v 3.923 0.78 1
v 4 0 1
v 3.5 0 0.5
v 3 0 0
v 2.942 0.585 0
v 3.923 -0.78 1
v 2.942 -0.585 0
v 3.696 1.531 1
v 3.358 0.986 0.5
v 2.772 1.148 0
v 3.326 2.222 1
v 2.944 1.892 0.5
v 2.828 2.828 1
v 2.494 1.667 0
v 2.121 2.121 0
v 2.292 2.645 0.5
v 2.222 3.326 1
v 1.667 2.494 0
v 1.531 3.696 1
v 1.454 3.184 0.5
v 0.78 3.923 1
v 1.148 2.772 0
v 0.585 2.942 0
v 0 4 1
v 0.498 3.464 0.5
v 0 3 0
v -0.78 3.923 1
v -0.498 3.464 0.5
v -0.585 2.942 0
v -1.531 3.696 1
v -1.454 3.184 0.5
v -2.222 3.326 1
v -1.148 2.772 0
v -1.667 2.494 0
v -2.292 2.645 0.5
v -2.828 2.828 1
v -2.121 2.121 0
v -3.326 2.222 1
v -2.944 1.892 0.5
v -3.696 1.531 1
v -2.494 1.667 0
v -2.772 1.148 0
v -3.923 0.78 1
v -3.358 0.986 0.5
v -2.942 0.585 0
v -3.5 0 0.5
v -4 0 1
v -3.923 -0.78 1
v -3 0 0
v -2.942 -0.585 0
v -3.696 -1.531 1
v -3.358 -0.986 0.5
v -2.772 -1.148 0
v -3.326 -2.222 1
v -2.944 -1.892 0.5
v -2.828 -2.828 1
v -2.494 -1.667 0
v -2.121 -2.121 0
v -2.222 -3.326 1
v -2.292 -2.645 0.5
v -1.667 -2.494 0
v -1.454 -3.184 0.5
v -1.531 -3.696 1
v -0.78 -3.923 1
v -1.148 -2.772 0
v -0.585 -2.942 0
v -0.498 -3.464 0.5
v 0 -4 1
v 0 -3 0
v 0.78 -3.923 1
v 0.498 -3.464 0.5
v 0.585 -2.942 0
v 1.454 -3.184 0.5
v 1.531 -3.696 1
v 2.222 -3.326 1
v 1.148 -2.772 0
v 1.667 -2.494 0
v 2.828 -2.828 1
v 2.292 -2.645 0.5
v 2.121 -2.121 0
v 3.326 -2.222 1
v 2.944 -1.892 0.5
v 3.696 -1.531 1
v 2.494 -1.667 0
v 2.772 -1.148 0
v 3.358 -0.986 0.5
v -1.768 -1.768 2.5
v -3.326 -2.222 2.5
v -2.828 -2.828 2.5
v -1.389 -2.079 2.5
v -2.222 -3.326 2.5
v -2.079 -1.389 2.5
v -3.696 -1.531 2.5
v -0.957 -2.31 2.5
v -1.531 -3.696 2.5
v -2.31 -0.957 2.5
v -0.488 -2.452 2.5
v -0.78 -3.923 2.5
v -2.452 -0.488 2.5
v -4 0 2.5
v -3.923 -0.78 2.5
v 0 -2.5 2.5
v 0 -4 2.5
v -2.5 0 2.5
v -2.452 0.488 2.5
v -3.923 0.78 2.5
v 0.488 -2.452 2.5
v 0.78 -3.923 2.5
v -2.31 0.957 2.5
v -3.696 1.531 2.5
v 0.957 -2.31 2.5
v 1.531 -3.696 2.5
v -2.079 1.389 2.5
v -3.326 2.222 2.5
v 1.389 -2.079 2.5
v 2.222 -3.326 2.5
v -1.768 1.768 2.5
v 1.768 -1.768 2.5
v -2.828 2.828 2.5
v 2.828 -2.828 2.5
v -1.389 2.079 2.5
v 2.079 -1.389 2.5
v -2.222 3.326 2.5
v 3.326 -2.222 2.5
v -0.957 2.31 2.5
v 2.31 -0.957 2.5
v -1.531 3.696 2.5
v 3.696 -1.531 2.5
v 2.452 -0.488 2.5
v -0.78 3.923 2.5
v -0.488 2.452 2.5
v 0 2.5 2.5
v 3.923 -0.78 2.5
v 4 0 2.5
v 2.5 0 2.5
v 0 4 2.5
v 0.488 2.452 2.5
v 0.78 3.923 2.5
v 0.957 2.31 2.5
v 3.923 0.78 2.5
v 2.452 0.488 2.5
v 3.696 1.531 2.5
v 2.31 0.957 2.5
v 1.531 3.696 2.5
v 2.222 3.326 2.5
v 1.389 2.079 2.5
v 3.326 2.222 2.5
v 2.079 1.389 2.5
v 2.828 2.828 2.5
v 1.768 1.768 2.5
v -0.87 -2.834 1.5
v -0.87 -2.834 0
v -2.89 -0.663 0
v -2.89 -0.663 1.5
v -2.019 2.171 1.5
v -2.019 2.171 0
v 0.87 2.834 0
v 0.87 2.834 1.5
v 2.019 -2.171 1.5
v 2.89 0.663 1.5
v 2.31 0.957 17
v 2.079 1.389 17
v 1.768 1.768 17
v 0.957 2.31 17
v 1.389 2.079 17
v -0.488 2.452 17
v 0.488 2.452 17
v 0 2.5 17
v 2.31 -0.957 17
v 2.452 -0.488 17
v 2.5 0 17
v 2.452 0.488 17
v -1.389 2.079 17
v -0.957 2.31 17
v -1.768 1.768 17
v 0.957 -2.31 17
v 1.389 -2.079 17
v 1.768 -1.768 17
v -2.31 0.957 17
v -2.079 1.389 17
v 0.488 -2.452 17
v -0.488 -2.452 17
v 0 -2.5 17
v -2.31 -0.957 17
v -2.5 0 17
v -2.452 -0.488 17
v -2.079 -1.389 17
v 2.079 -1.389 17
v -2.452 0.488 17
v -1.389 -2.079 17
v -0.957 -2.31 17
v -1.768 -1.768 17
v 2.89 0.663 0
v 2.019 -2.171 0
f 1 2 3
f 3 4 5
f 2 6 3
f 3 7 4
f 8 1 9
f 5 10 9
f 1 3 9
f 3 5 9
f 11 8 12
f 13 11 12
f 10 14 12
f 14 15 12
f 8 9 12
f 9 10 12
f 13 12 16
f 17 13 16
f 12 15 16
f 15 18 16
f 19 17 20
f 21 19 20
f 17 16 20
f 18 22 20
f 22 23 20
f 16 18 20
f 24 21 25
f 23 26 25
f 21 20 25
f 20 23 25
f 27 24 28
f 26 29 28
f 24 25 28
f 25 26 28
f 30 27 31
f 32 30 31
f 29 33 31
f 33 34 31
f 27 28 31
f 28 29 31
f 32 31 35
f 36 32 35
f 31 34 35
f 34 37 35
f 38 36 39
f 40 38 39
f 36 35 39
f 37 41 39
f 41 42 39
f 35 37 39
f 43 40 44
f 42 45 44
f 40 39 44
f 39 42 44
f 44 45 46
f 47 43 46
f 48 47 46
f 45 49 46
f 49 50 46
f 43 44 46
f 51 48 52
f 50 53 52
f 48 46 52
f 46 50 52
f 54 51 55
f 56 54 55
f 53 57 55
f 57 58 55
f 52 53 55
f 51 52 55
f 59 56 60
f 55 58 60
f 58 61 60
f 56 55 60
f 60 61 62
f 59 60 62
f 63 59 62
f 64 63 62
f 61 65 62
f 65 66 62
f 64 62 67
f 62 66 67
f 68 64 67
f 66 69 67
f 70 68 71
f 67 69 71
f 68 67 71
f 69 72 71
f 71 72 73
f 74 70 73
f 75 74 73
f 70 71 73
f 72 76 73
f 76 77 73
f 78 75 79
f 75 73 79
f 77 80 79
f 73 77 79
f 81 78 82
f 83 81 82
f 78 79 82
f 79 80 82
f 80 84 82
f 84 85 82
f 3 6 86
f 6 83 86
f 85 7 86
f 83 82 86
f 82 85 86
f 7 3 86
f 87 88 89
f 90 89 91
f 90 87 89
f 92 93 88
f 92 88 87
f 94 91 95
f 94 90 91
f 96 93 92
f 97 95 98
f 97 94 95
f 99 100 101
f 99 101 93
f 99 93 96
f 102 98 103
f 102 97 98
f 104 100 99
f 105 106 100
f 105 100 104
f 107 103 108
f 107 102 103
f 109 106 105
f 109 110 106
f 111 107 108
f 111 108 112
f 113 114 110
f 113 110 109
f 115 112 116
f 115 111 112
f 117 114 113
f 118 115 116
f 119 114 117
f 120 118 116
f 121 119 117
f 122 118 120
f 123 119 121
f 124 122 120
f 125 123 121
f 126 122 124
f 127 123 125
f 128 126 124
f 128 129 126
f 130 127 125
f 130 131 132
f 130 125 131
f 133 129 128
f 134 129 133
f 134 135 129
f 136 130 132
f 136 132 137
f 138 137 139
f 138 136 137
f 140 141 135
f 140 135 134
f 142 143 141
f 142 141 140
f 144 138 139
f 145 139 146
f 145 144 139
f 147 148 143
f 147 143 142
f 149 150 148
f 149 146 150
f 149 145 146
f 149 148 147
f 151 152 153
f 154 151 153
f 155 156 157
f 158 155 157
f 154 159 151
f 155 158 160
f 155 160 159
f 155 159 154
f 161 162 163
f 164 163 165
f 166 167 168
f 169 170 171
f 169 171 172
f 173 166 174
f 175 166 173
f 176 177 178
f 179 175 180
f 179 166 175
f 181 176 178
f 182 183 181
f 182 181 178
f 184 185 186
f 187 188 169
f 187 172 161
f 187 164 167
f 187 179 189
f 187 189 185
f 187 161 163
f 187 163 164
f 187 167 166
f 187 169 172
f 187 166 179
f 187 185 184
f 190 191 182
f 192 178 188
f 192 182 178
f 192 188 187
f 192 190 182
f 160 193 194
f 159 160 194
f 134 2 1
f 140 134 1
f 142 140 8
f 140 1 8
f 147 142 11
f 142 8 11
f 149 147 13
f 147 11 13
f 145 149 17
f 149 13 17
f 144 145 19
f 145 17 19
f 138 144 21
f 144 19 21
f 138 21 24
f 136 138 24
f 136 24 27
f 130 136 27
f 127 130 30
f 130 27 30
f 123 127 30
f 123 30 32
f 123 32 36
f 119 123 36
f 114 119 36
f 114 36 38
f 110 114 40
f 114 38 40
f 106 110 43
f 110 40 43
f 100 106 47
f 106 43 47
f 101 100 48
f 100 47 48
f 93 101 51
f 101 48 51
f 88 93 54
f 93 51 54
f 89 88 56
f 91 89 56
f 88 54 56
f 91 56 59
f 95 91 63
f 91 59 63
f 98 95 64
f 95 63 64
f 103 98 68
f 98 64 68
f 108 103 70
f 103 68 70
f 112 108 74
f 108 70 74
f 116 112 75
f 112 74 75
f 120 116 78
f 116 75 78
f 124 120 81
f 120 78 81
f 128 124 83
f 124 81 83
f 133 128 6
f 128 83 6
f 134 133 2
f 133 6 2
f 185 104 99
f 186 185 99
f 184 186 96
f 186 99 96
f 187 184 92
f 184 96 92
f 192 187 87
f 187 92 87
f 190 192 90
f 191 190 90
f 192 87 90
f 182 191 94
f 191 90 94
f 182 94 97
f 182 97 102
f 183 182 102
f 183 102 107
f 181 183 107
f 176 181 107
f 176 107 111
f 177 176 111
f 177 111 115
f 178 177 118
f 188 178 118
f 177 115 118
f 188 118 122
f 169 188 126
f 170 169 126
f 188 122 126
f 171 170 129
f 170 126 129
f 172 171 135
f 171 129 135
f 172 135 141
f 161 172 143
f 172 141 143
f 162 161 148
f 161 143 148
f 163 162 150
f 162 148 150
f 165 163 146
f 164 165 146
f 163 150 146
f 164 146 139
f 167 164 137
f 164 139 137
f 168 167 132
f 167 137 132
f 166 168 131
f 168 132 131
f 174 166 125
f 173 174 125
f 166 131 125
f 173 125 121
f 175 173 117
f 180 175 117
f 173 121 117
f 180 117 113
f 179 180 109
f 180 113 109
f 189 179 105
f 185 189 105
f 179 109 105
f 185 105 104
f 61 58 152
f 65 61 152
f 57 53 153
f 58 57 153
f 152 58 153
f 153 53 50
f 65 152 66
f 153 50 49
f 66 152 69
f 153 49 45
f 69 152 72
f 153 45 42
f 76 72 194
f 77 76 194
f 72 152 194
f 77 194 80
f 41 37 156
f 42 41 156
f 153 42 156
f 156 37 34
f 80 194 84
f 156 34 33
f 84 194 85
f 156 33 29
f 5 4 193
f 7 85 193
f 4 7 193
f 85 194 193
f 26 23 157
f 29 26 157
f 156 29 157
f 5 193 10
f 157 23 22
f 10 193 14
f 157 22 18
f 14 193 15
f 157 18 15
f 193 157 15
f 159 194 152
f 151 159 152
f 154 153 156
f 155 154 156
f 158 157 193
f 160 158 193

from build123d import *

# Parameters (mm, degrees)
SKETCH2_R           = 4
BOSS_EXTRUDE1_DEPTH = 2.5
SKETCH2_6_R         = 4
SKETCH2_6_R_2       = 2.5
BOSS_EXTRUDE2_DEPTH = 2.5
SKETCH3_R           = 2.5
BOSS_EXTRUDE3_DEPTH = 14.5
CHAMFER2_SIZE       = 1
CUT_EXTRUDE1_DEPTH  = 1.5


with BuildPart() as part:
    # Sketch2 → Boss-Extrude1 (new body)
    with BuildSketch(Plane.XY):
        Circle(SKETCH2_R)
    extrude(amount=BOSS_EXTRUDE1_DEPTH)

    # Sketch2<6> → Boss-Extrude2 (add)
    with BuildSketch(Plane.XY):
        Circle(SKETCH2_6_R)
        Circle(SKETCH2_6_R_2, mode=Mode.SUBTRACT)
    extrude(amount=BOSS_EXTRUDE2_DEPTH)

    # Sketch3 → Boss-Extrude3 (add)
    with BuildSketch(Plane.XY.offset(2.5)):
        with Locations(Location((0, 0, 0), (0, 0, 180))):
            Circle(SKETCH3_R)
    extrude(amount=BOSS_EXTRUDE3_DEPTH)

    # Chamfer2
    chamfer2_edges = [part.edges().sort_by_distance(p)[0] for p in [
        (-4, 0, 0),
    ]]
    chamfer(chamfer2_edges, length=CHAMFER2_SIZE)

    # Sketch4 → Cut-Extrude1 (cut)
    with BuildSketch(Plane(origin=(0, 0, 0), x_dir=(-1, 0, 0), z_dir=(0, 0, -1))):
        Polygon((-0.870420924, 2.834447623), (-2.889914109, 0.66341718), (-2.019493185, -2.171030443), (0.870420924, -2.834447623), (2.889914109, -0.66341718), (2.019493185, 2.171030443), align=None)
    extrude(amount=-CUT_EXTRUDE1_DEPTH, mode=Mode.SUBTRACT)


solid = part.part
